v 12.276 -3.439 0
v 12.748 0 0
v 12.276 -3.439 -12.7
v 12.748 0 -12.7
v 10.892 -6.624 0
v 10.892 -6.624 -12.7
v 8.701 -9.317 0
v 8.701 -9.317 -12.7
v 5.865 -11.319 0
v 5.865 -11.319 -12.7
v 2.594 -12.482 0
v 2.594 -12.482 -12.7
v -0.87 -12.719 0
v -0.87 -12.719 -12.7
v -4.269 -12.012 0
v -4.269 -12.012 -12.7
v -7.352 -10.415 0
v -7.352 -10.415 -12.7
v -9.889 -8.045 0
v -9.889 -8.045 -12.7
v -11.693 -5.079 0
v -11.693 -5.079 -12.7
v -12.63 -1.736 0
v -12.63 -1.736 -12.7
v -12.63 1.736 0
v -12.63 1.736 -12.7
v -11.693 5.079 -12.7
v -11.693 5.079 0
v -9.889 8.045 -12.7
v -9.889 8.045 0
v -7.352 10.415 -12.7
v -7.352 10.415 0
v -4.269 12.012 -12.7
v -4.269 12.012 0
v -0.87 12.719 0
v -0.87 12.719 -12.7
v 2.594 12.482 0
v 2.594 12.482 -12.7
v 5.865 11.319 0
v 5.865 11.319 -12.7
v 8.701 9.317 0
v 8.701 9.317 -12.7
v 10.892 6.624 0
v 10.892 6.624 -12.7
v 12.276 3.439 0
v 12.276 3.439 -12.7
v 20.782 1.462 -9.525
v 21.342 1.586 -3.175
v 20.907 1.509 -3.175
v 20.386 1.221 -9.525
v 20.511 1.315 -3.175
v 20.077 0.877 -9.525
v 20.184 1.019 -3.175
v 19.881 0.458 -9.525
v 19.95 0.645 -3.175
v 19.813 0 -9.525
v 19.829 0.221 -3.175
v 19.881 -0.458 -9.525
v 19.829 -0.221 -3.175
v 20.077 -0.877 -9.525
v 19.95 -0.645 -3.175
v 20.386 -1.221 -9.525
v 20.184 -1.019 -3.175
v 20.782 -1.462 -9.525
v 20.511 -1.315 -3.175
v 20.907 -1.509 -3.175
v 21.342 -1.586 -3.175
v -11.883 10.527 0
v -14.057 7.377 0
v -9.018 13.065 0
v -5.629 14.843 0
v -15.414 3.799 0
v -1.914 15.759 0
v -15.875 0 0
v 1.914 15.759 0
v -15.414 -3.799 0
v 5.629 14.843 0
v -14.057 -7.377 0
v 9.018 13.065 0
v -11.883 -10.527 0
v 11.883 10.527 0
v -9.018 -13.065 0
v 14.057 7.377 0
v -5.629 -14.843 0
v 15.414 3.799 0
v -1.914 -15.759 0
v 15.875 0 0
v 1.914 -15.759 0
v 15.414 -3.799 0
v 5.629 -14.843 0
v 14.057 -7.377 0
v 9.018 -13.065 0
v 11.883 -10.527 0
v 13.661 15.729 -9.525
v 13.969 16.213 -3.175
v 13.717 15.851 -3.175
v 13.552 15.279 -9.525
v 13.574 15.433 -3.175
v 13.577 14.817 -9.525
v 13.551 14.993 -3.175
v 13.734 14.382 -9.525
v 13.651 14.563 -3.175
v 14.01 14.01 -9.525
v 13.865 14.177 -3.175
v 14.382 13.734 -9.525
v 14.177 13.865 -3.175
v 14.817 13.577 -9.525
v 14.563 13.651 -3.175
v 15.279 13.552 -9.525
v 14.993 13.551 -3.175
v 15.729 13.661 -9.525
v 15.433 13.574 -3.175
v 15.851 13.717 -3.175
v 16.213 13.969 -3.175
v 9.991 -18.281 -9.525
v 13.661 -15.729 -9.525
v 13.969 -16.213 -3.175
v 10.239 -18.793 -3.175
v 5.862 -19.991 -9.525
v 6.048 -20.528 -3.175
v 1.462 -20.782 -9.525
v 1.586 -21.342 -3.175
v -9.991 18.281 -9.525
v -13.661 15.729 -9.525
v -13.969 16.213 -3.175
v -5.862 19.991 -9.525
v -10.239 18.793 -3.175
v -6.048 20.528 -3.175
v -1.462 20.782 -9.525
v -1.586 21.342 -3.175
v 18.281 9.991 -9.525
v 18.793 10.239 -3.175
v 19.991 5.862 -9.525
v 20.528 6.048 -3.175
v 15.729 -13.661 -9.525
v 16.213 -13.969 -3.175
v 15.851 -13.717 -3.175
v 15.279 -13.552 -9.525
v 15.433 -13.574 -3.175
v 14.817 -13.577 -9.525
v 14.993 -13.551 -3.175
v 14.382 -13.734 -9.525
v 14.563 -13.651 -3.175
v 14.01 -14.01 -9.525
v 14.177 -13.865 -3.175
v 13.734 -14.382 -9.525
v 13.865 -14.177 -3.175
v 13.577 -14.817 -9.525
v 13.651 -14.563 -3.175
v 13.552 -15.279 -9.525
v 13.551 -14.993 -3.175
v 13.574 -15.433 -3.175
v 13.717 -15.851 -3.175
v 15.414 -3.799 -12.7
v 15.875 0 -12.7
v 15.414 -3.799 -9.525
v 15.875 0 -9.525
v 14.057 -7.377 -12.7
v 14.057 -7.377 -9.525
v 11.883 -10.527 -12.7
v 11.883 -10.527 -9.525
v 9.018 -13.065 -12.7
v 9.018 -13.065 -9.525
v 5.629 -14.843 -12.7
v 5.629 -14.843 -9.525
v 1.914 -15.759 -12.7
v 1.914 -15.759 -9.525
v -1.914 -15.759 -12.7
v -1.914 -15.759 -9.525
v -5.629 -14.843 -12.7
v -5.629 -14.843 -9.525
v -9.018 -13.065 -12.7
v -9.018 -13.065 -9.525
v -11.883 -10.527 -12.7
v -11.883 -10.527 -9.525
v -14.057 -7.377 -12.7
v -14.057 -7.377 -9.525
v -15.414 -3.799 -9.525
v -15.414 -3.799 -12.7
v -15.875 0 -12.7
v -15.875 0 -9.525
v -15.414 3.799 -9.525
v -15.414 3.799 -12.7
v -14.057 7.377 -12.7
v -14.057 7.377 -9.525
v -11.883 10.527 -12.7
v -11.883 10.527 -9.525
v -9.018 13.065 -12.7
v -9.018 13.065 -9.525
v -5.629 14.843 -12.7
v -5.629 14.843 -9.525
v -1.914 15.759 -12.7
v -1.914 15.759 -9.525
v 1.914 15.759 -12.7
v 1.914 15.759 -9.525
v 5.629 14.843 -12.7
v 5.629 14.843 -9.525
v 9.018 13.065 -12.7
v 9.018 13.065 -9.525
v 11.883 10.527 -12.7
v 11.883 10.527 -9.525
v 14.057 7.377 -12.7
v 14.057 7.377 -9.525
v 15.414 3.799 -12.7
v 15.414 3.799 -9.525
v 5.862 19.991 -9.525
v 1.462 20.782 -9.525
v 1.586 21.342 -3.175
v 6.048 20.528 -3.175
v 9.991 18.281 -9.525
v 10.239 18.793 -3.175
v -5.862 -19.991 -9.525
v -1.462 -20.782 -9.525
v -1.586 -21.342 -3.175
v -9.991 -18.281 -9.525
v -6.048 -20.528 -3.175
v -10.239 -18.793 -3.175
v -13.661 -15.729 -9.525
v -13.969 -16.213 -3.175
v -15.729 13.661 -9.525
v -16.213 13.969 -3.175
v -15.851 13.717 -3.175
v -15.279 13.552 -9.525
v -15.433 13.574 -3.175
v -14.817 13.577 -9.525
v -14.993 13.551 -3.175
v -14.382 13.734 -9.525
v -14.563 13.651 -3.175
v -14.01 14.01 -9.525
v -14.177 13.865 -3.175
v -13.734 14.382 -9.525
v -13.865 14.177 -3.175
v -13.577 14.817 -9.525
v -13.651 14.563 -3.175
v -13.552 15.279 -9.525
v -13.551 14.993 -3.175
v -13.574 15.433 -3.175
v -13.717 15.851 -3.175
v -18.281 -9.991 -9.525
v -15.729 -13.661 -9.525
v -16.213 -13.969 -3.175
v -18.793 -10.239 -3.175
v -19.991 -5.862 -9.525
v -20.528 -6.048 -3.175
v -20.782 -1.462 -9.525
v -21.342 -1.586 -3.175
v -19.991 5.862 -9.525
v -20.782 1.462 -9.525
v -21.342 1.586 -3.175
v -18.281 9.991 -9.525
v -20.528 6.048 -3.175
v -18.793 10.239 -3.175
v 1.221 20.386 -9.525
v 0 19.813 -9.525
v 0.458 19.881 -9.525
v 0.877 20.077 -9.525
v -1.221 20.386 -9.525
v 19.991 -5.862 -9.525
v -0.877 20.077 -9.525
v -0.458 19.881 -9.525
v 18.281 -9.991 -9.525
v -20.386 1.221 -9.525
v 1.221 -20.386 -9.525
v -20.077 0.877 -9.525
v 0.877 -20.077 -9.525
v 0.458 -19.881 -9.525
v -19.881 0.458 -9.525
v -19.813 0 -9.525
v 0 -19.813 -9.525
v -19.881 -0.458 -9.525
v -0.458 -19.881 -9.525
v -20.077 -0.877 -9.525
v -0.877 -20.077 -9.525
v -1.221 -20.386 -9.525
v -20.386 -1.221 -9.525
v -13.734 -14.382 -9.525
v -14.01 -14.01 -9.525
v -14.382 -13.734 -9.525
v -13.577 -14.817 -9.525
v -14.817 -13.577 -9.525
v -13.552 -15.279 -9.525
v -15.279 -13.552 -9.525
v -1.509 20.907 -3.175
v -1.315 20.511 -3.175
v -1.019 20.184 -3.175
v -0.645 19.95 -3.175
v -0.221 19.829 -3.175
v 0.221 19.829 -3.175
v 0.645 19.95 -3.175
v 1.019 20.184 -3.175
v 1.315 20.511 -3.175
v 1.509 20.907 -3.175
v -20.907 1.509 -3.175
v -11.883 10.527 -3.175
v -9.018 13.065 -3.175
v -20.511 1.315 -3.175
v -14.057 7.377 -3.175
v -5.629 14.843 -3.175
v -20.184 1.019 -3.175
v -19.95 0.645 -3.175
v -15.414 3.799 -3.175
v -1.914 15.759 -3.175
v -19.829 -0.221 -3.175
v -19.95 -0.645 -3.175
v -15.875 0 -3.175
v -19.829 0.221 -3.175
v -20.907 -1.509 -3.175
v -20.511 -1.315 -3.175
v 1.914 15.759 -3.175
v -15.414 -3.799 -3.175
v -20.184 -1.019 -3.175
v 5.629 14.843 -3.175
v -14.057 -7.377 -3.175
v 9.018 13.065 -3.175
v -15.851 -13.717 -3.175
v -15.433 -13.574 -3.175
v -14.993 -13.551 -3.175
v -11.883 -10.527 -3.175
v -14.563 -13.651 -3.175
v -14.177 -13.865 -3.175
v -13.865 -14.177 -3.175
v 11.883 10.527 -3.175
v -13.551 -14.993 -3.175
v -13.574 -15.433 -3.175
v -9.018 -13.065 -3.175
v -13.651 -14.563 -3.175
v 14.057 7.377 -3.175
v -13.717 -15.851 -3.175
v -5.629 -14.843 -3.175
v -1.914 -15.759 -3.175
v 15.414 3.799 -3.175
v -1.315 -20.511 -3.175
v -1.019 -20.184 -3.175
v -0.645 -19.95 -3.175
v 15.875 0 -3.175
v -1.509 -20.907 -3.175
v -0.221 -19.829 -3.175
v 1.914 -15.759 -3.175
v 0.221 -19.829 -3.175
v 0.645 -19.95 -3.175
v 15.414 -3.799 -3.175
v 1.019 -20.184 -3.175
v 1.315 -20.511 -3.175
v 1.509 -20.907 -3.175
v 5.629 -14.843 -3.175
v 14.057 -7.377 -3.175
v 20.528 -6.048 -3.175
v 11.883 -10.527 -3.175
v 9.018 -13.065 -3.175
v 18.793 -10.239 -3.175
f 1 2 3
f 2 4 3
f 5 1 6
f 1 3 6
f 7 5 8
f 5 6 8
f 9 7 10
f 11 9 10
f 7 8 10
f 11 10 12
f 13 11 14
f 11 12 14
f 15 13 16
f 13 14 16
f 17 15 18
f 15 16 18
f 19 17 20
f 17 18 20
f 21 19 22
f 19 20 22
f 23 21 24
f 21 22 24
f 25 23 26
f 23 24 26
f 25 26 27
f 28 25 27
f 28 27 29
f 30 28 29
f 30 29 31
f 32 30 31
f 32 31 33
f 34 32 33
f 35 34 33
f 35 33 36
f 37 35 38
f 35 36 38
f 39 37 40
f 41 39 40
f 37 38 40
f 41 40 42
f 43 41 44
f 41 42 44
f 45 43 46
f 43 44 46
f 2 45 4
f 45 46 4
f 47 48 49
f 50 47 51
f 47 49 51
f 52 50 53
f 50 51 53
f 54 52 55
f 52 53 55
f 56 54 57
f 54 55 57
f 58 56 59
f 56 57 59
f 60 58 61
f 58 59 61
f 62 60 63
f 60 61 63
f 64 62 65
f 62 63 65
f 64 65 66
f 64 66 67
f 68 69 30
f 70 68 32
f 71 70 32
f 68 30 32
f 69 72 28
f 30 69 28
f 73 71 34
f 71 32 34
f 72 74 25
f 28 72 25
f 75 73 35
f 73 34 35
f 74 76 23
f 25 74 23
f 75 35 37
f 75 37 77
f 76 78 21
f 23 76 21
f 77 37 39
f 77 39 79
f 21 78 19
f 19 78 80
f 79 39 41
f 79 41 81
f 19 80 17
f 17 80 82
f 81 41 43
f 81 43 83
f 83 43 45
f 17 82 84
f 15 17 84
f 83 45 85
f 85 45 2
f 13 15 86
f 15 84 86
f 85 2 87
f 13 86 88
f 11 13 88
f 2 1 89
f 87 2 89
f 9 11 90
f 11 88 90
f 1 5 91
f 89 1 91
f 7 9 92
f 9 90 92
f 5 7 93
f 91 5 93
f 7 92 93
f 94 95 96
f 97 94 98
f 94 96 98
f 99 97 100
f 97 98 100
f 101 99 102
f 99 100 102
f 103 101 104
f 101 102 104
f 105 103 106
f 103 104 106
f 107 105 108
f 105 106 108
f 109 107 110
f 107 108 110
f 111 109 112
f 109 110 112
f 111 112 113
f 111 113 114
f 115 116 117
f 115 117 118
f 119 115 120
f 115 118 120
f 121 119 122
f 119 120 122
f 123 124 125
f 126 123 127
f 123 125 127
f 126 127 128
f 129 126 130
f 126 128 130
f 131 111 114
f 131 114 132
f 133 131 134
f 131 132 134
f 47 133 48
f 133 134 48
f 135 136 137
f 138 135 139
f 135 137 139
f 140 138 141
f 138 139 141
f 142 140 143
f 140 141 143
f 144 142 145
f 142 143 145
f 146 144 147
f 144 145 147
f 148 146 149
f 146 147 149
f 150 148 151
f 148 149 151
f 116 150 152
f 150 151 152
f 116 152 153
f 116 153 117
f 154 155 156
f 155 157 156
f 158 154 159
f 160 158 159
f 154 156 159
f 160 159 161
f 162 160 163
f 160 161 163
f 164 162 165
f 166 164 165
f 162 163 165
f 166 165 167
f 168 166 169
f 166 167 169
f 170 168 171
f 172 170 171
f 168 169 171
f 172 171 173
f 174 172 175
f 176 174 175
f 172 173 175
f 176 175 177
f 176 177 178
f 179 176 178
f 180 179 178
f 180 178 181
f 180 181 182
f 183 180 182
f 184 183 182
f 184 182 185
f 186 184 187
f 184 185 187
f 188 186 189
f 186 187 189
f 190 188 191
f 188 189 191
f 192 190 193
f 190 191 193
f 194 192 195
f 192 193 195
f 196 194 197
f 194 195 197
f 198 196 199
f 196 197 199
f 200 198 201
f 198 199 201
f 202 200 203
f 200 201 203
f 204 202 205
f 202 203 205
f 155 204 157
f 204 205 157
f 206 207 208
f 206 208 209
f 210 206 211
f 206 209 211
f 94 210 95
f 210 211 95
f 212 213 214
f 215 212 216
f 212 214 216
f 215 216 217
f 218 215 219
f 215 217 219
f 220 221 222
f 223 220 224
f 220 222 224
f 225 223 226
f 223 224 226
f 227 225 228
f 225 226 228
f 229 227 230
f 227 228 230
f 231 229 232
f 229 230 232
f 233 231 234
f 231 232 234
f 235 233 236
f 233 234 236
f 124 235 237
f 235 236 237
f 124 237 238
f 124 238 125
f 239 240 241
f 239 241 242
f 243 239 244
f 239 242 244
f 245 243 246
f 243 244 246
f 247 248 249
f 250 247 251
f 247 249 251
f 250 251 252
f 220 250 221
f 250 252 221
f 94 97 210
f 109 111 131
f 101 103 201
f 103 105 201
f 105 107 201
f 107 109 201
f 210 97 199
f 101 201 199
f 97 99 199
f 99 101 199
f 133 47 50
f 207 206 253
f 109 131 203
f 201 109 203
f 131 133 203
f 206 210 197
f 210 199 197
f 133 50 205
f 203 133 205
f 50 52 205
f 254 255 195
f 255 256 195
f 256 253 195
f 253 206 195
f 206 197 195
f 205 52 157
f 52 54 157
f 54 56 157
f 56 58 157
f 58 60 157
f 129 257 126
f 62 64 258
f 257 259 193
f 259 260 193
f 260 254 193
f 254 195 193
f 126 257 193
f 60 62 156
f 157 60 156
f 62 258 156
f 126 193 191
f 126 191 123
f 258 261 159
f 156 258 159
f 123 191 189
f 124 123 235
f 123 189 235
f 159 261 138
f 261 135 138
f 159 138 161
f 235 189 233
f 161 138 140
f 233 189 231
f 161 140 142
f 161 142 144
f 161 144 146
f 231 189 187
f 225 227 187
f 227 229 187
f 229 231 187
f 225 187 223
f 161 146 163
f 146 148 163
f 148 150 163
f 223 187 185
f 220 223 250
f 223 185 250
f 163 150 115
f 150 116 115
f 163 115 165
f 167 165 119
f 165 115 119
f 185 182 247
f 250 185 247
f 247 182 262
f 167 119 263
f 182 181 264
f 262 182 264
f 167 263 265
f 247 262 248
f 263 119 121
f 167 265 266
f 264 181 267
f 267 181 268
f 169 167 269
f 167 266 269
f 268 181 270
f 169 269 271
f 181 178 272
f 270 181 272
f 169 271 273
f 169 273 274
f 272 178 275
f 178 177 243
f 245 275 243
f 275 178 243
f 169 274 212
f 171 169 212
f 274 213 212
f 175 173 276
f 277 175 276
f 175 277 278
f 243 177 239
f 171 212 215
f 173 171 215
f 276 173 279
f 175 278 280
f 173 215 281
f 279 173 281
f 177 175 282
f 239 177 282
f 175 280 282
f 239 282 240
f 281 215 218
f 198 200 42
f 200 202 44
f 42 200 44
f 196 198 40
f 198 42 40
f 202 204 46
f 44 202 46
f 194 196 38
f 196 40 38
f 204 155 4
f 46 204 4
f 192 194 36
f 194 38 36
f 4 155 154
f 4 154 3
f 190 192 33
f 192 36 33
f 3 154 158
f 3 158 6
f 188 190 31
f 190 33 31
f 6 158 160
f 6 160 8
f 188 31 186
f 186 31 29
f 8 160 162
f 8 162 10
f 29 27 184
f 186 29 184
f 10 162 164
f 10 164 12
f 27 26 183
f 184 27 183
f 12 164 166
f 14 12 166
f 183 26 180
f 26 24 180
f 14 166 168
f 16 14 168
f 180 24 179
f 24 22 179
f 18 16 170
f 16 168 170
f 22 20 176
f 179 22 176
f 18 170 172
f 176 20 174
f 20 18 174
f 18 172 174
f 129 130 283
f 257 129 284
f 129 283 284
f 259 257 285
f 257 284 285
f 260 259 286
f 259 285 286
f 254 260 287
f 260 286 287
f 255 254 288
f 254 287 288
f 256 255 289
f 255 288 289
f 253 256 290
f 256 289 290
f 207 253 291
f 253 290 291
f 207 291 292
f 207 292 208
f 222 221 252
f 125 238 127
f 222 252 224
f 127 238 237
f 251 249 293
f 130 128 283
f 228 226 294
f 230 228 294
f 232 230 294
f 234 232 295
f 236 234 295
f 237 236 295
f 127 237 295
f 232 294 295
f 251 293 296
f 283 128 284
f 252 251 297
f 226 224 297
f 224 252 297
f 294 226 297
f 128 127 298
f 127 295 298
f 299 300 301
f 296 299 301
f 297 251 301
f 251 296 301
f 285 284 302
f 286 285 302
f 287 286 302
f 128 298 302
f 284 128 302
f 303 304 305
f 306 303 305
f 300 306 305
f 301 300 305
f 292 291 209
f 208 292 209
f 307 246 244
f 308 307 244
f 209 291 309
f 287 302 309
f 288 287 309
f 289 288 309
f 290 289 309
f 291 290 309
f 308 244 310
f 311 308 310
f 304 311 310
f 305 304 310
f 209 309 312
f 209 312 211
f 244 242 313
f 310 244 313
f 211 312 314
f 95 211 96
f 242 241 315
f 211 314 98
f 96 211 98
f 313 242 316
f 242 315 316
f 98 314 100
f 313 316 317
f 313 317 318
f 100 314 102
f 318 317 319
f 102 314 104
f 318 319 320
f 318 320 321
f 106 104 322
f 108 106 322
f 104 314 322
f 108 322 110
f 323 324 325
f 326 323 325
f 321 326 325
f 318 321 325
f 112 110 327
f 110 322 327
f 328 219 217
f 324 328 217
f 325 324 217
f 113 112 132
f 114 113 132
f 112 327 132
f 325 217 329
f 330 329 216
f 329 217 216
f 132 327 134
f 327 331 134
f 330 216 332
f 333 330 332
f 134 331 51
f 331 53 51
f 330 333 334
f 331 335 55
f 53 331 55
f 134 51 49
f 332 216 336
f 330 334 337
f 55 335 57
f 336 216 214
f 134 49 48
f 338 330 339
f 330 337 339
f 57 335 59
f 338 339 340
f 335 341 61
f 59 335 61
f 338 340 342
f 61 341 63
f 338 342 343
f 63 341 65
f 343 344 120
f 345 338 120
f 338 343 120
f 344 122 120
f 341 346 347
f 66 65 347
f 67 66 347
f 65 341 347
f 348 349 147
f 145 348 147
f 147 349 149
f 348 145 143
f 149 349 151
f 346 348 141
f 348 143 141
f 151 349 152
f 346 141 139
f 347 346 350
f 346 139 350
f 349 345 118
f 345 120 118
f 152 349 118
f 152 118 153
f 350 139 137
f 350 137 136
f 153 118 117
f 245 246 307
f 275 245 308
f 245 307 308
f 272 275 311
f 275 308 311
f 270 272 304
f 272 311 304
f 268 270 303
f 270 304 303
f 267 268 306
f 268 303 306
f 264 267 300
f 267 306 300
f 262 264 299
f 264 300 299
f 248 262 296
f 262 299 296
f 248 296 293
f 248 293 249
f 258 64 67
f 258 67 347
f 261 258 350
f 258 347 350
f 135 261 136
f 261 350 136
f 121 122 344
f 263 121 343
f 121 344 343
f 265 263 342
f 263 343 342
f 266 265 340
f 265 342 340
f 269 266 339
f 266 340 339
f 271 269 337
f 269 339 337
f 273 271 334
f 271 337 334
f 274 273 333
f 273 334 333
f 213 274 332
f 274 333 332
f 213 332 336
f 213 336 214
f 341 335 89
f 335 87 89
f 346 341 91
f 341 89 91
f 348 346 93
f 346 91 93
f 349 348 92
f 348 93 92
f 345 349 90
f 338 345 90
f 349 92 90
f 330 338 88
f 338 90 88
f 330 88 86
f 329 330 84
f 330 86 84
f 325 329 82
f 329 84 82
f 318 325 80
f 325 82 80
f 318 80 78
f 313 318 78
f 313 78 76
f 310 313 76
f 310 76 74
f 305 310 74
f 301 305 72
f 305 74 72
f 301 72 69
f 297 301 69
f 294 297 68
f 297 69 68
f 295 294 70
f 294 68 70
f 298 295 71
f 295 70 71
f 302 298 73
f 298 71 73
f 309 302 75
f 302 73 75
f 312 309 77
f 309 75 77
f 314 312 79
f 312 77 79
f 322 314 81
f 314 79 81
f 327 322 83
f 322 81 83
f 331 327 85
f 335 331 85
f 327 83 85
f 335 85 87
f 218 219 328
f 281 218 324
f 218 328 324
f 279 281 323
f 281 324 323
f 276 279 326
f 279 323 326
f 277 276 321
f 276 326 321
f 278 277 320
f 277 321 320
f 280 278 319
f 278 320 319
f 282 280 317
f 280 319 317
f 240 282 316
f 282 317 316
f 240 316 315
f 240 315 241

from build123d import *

# Parameters (mm, degrees)
SKETCH2_R         = 1.5875
EXTRUDE1_DEPTH    = 32.728717878
CIRPATTERN1_COUNT = 8


with BuildPart() as part:
    # Sketch1 → Revolve1 (revolve)
    with BuildSketch(Plane(origin=(0, 0, 0), x_dir=(0, 0, -1), z_dir=(1, 0, 0)), mode=Mode.PRIVATE) as revolve1_sk:
        Polygon((0, 15.875), (0, 12.74826), (12.7, 12.74826), (12.7, 15.875), (9.525, 15.875), (9.525, 20.83308), (3.175, 21.40077), (3.175, 15.875), align=None)
    revolve(revolve1_sk.sketch.rotate(Axis((0, 0, 0), (0, 0, -1)), 90), axis=Axis((0, 0, 0), (0, 0, -1)))

    # Sketch2 → Extrude1 (cut, through all)
    with BuildSketch(Plane.XY.offset(-3.175)):
        with Locations((0, 21.40077)):
            Circle(SKETCH2_R)
    extrude1 = extrude(amount=-EXTRUDE1_DEPTH, mode=Mode.SUBTRACT)

    # CirPattern1: Extrude1 ×8 about axis
    cirpattern1_axis = Axis((0, 0, 0), (0, 0, 1))
    for i in range(1, CIRPATTERN1_COUNT):
        add(extrude1.rotate(cirpattern1_axis, i * 360 / CIRPATTERN1_COUNT), mode=Mode.SUBTRACT)


solid = part.part
